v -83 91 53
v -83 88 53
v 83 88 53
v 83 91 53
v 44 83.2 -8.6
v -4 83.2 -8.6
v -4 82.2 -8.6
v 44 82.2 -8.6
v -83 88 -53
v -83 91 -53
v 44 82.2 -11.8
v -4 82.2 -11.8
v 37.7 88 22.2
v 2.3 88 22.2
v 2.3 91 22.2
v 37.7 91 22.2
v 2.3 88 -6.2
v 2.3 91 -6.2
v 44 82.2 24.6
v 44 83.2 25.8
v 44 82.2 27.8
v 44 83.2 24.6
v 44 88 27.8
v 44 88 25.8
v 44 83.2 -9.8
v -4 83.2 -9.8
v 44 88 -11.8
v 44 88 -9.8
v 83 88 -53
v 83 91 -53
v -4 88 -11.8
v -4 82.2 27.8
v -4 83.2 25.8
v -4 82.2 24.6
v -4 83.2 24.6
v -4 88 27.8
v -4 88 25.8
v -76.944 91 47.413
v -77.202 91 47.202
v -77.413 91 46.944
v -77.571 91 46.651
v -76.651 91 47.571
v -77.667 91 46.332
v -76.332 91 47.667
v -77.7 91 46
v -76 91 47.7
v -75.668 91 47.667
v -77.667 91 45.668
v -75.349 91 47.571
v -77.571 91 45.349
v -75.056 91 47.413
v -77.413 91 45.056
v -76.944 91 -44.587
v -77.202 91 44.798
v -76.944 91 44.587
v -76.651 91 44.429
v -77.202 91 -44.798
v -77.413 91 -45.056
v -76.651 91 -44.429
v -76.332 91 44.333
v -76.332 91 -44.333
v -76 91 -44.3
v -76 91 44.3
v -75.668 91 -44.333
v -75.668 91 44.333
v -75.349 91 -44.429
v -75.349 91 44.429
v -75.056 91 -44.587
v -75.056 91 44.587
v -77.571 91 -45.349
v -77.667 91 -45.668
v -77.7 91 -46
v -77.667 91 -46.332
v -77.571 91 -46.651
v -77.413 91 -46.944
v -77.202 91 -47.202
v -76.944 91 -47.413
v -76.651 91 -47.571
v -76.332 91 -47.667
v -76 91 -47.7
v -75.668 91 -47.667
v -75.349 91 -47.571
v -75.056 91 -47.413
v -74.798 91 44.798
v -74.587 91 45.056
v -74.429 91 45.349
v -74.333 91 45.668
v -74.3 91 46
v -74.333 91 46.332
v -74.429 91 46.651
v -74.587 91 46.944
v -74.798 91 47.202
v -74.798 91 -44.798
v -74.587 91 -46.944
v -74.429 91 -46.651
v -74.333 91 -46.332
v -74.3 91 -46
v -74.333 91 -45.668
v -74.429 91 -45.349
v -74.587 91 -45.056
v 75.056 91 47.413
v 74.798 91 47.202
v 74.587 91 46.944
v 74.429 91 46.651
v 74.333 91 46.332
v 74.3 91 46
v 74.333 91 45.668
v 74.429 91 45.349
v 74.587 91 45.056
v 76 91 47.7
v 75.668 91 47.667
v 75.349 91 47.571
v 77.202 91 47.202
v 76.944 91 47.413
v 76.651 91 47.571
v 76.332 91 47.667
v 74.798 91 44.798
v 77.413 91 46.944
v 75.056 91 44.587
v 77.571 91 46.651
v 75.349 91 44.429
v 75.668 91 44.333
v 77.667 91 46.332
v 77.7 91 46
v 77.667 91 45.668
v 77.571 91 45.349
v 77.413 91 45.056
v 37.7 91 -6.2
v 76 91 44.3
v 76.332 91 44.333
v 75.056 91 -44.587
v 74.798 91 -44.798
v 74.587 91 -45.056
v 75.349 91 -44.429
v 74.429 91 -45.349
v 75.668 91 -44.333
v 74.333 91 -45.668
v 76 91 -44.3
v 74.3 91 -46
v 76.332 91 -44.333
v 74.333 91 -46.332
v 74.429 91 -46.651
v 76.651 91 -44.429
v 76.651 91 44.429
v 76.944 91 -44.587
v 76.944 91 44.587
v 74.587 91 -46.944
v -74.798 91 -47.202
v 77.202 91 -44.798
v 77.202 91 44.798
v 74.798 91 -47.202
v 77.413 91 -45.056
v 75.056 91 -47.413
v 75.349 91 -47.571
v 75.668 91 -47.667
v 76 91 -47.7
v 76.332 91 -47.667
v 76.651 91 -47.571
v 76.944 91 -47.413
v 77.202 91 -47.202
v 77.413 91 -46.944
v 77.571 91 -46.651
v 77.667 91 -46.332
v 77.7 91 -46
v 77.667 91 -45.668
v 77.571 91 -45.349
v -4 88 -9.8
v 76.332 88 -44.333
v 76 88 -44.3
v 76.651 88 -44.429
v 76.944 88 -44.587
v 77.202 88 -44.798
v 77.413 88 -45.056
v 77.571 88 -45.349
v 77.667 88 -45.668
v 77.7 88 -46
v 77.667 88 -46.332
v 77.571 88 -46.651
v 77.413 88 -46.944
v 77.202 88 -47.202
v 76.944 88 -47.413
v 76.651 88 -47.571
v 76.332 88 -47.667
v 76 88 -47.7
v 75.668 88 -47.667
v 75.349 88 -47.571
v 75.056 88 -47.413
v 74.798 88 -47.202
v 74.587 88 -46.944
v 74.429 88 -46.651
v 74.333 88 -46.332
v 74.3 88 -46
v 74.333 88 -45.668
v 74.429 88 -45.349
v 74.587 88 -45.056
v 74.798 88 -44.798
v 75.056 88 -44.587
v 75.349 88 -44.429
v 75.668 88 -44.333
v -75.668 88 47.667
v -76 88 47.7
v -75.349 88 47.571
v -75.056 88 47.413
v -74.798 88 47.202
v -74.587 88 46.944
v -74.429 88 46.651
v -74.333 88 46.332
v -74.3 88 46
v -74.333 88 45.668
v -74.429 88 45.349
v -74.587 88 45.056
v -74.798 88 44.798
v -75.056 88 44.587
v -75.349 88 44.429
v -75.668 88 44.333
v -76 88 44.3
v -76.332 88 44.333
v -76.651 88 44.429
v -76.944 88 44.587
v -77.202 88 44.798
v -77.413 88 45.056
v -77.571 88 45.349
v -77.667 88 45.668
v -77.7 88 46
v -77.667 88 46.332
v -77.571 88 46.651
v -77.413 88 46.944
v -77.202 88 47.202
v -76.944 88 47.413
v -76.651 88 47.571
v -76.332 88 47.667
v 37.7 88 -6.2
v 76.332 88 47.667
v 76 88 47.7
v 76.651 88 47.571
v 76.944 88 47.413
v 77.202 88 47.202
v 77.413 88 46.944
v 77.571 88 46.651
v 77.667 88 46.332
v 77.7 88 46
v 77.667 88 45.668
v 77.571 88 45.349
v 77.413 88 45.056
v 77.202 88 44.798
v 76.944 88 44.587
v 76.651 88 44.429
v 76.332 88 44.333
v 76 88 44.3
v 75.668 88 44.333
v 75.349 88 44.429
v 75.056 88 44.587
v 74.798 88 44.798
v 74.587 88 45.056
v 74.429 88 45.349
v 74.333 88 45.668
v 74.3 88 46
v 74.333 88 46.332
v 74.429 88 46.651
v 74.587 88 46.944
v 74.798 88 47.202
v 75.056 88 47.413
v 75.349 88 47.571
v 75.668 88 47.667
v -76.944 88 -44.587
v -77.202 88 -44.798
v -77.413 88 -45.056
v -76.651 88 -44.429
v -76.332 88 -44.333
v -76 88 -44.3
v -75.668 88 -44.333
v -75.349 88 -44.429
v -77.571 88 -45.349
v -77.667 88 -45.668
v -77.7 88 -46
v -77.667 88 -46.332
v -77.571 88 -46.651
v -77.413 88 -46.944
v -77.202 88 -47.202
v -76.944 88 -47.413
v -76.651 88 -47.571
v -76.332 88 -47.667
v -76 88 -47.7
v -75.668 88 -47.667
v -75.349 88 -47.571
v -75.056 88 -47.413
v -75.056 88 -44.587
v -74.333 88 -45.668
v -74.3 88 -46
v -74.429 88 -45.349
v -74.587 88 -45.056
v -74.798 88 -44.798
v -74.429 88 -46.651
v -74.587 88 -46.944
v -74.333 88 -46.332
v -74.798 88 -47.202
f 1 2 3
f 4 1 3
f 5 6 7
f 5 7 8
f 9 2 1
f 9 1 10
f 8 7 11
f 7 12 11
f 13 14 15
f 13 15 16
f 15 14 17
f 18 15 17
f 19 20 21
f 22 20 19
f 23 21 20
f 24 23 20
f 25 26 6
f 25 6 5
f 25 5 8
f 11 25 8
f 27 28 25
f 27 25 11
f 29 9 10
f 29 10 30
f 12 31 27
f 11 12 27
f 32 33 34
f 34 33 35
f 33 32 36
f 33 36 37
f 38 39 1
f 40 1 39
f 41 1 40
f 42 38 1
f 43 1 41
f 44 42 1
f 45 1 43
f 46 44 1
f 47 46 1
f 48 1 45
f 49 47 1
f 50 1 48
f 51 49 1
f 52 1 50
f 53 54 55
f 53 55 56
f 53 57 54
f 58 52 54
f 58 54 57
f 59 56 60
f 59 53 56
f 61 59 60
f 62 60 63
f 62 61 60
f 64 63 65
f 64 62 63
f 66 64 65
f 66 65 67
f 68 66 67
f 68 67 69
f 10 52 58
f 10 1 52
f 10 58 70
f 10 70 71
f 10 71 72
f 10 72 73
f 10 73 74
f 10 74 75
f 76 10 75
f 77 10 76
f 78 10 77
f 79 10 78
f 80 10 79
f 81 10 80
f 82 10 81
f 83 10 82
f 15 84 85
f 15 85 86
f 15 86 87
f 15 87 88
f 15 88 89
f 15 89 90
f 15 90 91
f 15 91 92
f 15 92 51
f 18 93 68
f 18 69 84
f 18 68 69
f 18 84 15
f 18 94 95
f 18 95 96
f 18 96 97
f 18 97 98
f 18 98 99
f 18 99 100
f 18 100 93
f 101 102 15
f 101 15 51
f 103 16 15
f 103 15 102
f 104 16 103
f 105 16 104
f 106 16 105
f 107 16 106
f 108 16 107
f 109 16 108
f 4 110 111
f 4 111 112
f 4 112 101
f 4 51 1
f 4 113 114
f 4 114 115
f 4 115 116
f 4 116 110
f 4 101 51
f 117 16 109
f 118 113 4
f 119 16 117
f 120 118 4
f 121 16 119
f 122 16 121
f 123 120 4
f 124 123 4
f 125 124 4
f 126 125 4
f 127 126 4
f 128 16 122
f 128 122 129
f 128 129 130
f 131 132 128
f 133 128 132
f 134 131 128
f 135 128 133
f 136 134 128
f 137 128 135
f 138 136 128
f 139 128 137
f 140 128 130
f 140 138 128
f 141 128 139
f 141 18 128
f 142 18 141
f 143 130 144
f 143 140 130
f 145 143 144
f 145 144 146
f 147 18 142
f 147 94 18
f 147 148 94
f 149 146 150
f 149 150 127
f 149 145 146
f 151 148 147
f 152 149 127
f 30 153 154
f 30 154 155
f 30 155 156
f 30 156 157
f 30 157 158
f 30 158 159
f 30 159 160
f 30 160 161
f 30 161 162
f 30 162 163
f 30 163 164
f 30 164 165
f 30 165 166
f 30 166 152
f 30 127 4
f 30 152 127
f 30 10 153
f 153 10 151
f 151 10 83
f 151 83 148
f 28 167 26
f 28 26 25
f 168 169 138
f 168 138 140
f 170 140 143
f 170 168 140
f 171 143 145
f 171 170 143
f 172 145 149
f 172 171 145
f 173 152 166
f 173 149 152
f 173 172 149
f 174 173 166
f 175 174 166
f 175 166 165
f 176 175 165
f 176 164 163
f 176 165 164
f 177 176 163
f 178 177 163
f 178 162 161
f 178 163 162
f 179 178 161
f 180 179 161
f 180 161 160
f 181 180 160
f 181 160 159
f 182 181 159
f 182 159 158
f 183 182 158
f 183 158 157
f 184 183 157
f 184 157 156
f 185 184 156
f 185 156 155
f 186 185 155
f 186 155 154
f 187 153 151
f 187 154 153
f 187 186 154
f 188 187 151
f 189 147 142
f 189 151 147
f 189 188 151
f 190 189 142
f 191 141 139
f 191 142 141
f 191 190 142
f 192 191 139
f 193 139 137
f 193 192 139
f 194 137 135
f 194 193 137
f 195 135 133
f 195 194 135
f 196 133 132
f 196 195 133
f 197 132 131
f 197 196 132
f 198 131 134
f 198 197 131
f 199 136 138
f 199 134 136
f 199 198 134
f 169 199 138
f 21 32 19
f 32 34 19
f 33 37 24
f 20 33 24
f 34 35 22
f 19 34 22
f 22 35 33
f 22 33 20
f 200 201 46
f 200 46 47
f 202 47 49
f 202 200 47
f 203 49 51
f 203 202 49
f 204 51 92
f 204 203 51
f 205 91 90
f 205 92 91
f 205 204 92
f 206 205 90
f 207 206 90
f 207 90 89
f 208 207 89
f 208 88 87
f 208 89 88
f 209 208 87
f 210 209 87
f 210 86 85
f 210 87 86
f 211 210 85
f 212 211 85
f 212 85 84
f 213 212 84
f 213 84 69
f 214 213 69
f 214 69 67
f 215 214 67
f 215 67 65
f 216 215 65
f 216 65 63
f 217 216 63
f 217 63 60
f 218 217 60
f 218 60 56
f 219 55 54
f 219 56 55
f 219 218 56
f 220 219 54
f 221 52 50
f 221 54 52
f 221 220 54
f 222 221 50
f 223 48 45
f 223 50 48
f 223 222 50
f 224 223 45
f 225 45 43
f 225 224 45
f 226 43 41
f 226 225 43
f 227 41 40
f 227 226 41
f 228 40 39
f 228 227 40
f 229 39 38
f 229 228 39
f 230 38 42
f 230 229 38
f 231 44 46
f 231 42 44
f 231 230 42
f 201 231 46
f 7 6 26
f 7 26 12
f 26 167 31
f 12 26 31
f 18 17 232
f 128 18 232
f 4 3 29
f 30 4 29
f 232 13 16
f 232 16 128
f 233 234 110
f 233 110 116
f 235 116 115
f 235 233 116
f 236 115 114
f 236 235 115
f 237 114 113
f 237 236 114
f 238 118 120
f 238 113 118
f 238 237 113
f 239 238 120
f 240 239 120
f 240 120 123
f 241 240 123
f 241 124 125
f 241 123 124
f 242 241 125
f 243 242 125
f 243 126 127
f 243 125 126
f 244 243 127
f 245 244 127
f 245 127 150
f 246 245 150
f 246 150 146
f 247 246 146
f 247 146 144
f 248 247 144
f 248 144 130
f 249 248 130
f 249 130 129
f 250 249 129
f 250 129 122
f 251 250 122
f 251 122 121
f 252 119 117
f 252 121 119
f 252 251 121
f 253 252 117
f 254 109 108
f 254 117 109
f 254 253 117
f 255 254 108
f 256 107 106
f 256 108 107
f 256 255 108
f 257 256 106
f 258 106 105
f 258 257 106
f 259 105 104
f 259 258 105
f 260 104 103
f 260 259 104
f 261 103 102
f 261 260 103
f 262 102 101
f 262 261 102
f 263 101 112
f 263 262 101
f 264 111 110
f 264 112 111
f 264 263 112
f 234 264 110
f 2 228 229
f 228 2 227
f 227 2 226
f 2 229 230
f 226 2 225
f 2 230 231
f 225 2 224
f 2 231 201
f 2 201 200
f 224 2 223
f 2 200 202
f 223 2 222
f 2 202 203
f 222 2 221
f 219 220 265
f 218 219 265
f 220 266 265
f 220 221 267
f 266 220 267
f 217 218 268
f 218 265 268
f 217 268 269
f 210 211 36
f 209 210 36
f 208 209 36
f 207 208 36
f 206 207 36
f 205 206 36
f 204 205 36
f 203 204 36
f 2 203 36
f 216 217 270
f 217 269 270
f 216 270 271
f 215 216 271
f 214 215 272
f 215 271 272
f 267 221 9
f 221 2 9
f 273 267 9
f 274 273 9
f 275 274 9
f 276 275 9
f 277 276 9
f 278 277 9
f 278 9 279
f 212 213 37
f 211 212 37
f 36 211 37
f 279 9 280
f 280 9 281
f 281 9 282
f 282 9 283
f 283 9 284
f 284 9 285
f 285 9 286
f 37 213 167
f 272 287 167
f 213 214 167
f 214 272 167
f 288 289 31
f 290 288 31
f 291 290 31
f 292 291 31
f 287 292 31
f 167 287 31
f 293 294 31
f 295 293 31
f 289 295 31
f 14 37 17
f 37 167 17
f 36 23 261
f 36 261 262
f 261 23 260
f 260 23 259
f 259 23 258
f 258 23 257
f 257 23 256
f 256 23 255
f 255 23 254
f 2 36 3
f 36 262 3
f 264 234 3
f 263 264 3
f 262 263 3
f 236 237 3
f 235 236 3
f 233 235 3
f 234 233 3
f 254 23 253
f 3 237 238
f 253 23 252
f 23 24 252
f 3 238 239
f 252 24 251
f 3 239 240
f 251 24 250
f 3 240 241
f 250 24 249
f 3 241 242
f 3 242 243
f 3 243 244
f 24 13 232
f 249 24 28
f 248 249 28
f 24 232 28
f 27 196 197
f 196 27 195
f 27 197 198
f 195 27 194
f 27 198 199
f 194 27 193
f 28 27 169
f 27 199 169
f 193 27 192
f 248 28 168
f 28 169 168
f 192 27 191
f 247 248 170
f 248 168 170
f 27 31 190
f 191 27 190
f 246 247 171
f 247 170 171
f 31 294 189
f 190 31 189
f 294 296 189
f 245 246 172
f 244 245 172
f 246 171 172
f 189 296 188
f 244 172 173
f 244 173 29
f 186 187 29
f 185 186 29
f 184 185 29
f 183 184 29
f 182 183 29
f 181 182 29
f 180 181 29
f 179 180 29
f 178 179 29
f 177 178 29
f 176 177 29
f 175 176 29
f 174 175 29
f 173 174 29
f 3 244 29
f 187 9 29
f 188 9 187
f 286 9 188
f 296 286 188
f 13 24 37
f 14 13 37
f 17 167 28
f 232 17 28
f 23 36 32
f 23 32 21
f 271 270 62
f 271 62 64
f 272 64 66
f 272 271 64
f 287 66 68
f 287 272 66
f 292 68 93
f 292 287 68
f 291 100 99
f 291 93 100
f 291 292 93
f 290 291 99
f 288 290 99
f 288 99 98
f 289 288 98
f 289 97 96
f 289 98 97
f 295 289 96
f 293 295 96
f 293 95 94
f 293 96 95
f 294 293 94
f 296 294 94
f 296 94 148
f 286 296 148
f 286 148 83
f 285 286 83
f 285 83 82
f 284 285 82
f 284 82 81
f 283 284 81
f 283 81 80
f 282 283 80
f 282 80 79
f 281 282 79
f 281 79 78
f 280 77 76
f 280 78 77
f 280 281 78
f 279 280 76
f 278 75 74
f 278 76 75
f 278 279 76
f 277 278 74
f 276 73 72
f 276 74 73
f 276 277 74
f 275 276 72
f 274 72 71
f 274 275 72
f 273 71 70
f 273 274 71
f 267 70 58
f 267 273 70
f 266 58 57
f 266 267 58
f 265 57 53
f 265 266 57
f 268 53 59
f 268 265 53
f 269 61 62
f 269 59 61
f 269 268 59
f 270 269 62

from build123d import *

# Parameters (mm, degrees)
LID_PLATE_START               = 88
SKETCH1_W                     = 166
SKETCH1_H                     = 106
LID_PLATE_DEPTH               = 3
TFT_WINDOW_DEPTH              = 135.085793431
TFT_WINDOW_DEPTH_BACK         = 135.085793431
SKETCH2_W                     = 35.4
SKETCH2_H                     = 28.4
LID_SCREW_HOLES_M3_DEPTH      = 135.085793431
LID_SCREW_HOLES_M3_DEPTH_BACK = 135.085793431
SKETCH3_R                     = 1.7
TFT_RAILS_START               = 88
SKETCH4_W                     = 48
SKETCH4_H                     = 2
TFT_RAILS_DEPTH               = 5.8
TFT_RAIL_LIPS_START           = 83.2
SKETCH5_W                     = 48
SKETCH5_H                     = 1.2
TFT_RAIL_LIPS_DEPTH           = 1


with BuildPart() as part:
    # Sketch1 → Lid_Plate (new body)
    with BuildSketch(Plane(origin=(0, 0, 0), x_dir=(1, 0, 0), z_dir=(0, 1, 0)).offset(LID_PLATE_START)):
        Rectangle(SKETCH1_W, SKETCH1_H)
    extrude(amount=LID_PLATE_DEPTH)

    # Sketch2 → TFT_Window (cut, two sides: drawn at the far end of the back side and taken through both)
    with BuildSketch(Plane(origin=(0, 0, 0), x_dir=(1, 0, 0), z_dir=(0, 1, 0)).offset(-TFT_WINDOW_DEPTH_BACK)):
        with Locations((20, -8)):
            Rectangle(SKETCH2_W, SKETCH2_H)
    extrude(amount=TFT_WINDOW_DEPTH + TFT_WINDOW_DEPTH_BACK, mode=Mode.SUBTRACT)

    # Sketch3 → Lid_Screw_Holes_M3 (cut, two sides: drawn at the far end of the back side and taken through both)
    with BuildSketch(Plane(origin=(0, 0, 0), x_dir=(1, 0, 0), z_dir=(0, 1, 0)).offset(-LID_SCREW_HOLES_M3_DEPTH_BACK)):
        with Locations((-76, 46)):
            Circle(SKETCH3_R)
        with Locations((-76, -46)):
            Circle(SKETCH3_R)
        with Locations((76, 46)):
            Circle(SKETCH3_R)
        with Locations((76, -46)):
            Circle(SKETCH3_R)
    extrude(amount=LID_SCREW_HOLES_M3_DEPTH + LID_SCREW_HOLES_M3_DEPTH_BACK, mode=Mode.SUBTRACT)

    # Sketch4 → TFT_Rails (add)
    with BuildSketch(Plane(origin=(0, 0, 0), x_dir=(1, 0, 0), z_dir=(0, 1, 0)).offset(TFT_RAILS_START)):
        with Locations((20, 10.8)):
            Rectangle(SKETCH4_W, SKETCH4_H)
        with Locations((20, -26.8)):
            Rectangle(SKETCH4_W, SKETCH4_H)
    extrude(amount=-TFT_RAILS_DEPTH)

    # Sketch5 → TFT_Rail_Lips (add)
    with BuildSketch(Plane(origin=(0, 0, 0), x_dir=(1, 0, 0), z_dir=(0, 1, 0)).offset(TFT_RAIL_LIPS_START)):
        with Locations((20, 9.2)):
            Rectangle(SKETCH5_W, SKETCH5_H)
        with Locations((20, -25.2)):
            Rectangle(SKETCH5_W, SKETCH5_H)
    extrude(amount=-TFT_RAIL_LIPS_DEPTH)


solid = part.part
